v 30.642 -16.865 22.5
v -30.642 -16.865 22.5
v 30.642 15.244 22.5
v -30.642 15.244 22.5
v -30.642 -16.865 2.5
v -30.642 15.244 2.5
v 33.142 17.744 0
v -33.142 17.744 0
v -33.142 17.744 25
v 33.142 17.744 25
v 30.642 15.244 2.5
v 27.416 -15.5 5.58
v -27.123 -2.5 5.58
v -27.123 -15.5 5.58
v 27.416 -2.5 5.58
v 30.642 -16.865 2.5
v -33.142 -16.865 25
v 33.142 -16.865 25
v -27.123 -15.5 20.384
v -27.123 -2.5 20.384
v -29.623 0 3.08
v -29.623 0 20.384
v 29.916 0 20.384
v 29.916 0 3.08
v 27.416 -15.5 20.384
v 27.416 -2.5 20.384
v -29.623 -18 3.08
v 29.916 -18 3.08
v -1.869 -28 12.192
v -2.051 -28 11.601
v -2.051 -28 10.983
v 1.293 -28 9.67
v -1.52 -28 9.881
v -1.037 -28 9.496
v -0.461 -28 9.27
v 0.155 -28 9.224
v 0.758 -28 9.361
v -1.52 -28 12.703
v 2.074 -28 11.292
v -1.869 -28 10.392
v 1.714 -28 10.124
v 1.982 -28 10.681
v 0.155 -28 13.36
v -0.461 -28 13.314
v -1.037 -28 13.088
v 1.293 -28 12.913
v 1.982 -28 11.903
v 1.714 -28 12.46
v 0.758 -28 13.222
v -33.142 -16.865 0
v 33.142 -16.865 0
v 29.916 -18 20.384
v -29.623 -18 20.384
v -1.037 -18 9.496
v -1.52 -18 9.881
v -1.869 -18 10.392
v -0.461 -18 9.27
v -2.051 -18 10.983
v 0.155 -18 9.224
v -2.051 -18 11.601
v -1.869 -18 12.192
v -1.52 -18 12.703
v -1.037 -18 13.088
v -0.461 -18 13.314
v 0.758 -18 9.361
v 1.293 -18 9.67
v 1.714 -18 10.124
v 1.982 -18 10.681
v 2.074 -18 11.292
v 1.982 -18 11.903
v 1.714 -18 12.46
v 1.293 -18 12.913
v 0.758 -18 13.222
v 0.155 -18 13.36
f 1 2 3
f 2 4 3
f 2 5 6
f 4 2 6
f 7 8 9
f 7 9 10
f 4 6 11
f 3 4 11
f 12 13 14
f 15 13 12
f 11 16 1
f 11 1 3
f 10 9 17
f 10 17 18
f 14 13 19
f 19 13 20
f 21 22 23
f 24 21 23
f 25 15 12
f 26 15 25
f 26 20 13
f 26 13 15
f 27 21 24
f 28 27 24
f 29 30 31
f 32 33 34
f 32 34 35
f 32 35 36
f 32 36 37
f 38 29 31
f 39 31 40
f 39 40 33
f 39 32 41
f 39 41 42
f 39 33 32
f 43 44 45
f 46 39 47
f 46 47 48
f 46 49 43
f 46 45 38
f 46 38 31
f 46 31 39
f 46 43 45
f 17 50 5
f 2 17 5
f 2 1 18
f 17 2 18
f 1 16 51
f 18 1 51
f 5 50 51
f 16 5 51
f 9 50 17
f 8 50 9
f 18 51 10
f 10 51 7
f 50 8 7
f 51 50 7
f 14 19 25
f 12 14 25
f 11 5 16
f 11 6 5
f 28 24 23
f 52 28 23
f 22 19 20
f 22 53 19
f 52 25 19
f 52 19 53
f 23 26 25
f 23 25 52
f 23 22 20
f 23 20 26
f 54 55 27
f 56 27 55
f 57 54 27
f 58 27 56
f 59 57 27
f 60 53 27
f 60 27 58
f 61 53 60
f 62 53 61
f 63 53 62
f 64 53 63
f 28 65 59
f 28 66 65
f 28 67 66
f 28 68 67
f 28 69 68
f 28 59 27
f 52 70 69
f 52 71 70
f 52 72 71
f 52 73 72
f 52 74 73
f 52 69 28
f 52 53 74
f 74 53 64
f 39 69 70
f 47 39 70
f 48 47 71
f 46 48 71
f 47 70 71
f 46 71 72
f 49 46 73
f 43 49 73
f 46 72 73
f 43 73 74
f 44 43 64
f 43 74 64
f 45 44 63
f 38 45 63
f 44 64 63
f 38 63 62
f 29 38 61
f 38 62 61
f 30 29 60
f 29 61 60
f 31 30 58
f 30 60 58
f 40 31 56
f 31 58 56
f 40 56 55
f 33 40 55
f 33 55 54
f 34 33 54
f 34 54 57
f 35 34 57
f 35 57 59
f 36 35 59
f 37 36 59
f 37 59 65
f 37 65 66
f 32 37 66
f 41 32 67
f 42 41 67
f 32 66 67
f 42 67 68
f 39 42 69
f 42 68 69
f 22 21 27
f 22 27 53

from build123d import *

# Parameters (mm, degrees)
F0_W     = 66.2849135697
F0_H     = 34.6089396626
F1_DEPTH = 25
F2_T     = -2.5
F3_W     = 59.5391076058
F3_H     = 17.3044716939
F4_DEPTH = 18
F5_T     = -2.5
F6_R     = 2.0739167643
F7_DEPTH = 10


# Not quite as in the source:
# - the program builds the solid bodies; features that only make, move or delete a surface that nothing else refers to are left out


with BuildPart() as f1:
    # F0 (on Top) → F1 (new body)
    with BuildSketch(Plane.XY):
        with Locations((-1.8626e-06, 0.4399446771)):
            Rectangle(F0_W, F0_H)
    extrude(amount=F1_DEPTH)

    # F2
    f2_openings = [f1.faces().sort_by_distance(p)[0] for p in [
        (-2e-06, -16.864525, 12.5),
    ]]
    offset(amount=F2_T, openings=f2_openings)


with BuildPart() as f4:
    # F3 (on Front) → F4 (new body)
    with BuildSketch(Plane.XZ):
        with Locations((0.1466469839, 11.7318448611)):
            Rectangle(F3_W, F3_H)
    extrude(amount=F4_DEPTH)

    # F5
    f5_openings = [f4.faces().sort_by_distance(p)[0] for p in [
        (0.146647, -9, 20.384081),
    ]]
    offset(amount=F5_T, openings=f5_openings)

    # F6 (on face) → F7 (join)
    with BuildSketch(Plane.XZ.offset(18)):
        with Locations((0, 11.2918997183)):
            Circle(F6_R)
    extrude(amount=F7_DEPTH)


solid = Compound([f1.part, f4.part])
